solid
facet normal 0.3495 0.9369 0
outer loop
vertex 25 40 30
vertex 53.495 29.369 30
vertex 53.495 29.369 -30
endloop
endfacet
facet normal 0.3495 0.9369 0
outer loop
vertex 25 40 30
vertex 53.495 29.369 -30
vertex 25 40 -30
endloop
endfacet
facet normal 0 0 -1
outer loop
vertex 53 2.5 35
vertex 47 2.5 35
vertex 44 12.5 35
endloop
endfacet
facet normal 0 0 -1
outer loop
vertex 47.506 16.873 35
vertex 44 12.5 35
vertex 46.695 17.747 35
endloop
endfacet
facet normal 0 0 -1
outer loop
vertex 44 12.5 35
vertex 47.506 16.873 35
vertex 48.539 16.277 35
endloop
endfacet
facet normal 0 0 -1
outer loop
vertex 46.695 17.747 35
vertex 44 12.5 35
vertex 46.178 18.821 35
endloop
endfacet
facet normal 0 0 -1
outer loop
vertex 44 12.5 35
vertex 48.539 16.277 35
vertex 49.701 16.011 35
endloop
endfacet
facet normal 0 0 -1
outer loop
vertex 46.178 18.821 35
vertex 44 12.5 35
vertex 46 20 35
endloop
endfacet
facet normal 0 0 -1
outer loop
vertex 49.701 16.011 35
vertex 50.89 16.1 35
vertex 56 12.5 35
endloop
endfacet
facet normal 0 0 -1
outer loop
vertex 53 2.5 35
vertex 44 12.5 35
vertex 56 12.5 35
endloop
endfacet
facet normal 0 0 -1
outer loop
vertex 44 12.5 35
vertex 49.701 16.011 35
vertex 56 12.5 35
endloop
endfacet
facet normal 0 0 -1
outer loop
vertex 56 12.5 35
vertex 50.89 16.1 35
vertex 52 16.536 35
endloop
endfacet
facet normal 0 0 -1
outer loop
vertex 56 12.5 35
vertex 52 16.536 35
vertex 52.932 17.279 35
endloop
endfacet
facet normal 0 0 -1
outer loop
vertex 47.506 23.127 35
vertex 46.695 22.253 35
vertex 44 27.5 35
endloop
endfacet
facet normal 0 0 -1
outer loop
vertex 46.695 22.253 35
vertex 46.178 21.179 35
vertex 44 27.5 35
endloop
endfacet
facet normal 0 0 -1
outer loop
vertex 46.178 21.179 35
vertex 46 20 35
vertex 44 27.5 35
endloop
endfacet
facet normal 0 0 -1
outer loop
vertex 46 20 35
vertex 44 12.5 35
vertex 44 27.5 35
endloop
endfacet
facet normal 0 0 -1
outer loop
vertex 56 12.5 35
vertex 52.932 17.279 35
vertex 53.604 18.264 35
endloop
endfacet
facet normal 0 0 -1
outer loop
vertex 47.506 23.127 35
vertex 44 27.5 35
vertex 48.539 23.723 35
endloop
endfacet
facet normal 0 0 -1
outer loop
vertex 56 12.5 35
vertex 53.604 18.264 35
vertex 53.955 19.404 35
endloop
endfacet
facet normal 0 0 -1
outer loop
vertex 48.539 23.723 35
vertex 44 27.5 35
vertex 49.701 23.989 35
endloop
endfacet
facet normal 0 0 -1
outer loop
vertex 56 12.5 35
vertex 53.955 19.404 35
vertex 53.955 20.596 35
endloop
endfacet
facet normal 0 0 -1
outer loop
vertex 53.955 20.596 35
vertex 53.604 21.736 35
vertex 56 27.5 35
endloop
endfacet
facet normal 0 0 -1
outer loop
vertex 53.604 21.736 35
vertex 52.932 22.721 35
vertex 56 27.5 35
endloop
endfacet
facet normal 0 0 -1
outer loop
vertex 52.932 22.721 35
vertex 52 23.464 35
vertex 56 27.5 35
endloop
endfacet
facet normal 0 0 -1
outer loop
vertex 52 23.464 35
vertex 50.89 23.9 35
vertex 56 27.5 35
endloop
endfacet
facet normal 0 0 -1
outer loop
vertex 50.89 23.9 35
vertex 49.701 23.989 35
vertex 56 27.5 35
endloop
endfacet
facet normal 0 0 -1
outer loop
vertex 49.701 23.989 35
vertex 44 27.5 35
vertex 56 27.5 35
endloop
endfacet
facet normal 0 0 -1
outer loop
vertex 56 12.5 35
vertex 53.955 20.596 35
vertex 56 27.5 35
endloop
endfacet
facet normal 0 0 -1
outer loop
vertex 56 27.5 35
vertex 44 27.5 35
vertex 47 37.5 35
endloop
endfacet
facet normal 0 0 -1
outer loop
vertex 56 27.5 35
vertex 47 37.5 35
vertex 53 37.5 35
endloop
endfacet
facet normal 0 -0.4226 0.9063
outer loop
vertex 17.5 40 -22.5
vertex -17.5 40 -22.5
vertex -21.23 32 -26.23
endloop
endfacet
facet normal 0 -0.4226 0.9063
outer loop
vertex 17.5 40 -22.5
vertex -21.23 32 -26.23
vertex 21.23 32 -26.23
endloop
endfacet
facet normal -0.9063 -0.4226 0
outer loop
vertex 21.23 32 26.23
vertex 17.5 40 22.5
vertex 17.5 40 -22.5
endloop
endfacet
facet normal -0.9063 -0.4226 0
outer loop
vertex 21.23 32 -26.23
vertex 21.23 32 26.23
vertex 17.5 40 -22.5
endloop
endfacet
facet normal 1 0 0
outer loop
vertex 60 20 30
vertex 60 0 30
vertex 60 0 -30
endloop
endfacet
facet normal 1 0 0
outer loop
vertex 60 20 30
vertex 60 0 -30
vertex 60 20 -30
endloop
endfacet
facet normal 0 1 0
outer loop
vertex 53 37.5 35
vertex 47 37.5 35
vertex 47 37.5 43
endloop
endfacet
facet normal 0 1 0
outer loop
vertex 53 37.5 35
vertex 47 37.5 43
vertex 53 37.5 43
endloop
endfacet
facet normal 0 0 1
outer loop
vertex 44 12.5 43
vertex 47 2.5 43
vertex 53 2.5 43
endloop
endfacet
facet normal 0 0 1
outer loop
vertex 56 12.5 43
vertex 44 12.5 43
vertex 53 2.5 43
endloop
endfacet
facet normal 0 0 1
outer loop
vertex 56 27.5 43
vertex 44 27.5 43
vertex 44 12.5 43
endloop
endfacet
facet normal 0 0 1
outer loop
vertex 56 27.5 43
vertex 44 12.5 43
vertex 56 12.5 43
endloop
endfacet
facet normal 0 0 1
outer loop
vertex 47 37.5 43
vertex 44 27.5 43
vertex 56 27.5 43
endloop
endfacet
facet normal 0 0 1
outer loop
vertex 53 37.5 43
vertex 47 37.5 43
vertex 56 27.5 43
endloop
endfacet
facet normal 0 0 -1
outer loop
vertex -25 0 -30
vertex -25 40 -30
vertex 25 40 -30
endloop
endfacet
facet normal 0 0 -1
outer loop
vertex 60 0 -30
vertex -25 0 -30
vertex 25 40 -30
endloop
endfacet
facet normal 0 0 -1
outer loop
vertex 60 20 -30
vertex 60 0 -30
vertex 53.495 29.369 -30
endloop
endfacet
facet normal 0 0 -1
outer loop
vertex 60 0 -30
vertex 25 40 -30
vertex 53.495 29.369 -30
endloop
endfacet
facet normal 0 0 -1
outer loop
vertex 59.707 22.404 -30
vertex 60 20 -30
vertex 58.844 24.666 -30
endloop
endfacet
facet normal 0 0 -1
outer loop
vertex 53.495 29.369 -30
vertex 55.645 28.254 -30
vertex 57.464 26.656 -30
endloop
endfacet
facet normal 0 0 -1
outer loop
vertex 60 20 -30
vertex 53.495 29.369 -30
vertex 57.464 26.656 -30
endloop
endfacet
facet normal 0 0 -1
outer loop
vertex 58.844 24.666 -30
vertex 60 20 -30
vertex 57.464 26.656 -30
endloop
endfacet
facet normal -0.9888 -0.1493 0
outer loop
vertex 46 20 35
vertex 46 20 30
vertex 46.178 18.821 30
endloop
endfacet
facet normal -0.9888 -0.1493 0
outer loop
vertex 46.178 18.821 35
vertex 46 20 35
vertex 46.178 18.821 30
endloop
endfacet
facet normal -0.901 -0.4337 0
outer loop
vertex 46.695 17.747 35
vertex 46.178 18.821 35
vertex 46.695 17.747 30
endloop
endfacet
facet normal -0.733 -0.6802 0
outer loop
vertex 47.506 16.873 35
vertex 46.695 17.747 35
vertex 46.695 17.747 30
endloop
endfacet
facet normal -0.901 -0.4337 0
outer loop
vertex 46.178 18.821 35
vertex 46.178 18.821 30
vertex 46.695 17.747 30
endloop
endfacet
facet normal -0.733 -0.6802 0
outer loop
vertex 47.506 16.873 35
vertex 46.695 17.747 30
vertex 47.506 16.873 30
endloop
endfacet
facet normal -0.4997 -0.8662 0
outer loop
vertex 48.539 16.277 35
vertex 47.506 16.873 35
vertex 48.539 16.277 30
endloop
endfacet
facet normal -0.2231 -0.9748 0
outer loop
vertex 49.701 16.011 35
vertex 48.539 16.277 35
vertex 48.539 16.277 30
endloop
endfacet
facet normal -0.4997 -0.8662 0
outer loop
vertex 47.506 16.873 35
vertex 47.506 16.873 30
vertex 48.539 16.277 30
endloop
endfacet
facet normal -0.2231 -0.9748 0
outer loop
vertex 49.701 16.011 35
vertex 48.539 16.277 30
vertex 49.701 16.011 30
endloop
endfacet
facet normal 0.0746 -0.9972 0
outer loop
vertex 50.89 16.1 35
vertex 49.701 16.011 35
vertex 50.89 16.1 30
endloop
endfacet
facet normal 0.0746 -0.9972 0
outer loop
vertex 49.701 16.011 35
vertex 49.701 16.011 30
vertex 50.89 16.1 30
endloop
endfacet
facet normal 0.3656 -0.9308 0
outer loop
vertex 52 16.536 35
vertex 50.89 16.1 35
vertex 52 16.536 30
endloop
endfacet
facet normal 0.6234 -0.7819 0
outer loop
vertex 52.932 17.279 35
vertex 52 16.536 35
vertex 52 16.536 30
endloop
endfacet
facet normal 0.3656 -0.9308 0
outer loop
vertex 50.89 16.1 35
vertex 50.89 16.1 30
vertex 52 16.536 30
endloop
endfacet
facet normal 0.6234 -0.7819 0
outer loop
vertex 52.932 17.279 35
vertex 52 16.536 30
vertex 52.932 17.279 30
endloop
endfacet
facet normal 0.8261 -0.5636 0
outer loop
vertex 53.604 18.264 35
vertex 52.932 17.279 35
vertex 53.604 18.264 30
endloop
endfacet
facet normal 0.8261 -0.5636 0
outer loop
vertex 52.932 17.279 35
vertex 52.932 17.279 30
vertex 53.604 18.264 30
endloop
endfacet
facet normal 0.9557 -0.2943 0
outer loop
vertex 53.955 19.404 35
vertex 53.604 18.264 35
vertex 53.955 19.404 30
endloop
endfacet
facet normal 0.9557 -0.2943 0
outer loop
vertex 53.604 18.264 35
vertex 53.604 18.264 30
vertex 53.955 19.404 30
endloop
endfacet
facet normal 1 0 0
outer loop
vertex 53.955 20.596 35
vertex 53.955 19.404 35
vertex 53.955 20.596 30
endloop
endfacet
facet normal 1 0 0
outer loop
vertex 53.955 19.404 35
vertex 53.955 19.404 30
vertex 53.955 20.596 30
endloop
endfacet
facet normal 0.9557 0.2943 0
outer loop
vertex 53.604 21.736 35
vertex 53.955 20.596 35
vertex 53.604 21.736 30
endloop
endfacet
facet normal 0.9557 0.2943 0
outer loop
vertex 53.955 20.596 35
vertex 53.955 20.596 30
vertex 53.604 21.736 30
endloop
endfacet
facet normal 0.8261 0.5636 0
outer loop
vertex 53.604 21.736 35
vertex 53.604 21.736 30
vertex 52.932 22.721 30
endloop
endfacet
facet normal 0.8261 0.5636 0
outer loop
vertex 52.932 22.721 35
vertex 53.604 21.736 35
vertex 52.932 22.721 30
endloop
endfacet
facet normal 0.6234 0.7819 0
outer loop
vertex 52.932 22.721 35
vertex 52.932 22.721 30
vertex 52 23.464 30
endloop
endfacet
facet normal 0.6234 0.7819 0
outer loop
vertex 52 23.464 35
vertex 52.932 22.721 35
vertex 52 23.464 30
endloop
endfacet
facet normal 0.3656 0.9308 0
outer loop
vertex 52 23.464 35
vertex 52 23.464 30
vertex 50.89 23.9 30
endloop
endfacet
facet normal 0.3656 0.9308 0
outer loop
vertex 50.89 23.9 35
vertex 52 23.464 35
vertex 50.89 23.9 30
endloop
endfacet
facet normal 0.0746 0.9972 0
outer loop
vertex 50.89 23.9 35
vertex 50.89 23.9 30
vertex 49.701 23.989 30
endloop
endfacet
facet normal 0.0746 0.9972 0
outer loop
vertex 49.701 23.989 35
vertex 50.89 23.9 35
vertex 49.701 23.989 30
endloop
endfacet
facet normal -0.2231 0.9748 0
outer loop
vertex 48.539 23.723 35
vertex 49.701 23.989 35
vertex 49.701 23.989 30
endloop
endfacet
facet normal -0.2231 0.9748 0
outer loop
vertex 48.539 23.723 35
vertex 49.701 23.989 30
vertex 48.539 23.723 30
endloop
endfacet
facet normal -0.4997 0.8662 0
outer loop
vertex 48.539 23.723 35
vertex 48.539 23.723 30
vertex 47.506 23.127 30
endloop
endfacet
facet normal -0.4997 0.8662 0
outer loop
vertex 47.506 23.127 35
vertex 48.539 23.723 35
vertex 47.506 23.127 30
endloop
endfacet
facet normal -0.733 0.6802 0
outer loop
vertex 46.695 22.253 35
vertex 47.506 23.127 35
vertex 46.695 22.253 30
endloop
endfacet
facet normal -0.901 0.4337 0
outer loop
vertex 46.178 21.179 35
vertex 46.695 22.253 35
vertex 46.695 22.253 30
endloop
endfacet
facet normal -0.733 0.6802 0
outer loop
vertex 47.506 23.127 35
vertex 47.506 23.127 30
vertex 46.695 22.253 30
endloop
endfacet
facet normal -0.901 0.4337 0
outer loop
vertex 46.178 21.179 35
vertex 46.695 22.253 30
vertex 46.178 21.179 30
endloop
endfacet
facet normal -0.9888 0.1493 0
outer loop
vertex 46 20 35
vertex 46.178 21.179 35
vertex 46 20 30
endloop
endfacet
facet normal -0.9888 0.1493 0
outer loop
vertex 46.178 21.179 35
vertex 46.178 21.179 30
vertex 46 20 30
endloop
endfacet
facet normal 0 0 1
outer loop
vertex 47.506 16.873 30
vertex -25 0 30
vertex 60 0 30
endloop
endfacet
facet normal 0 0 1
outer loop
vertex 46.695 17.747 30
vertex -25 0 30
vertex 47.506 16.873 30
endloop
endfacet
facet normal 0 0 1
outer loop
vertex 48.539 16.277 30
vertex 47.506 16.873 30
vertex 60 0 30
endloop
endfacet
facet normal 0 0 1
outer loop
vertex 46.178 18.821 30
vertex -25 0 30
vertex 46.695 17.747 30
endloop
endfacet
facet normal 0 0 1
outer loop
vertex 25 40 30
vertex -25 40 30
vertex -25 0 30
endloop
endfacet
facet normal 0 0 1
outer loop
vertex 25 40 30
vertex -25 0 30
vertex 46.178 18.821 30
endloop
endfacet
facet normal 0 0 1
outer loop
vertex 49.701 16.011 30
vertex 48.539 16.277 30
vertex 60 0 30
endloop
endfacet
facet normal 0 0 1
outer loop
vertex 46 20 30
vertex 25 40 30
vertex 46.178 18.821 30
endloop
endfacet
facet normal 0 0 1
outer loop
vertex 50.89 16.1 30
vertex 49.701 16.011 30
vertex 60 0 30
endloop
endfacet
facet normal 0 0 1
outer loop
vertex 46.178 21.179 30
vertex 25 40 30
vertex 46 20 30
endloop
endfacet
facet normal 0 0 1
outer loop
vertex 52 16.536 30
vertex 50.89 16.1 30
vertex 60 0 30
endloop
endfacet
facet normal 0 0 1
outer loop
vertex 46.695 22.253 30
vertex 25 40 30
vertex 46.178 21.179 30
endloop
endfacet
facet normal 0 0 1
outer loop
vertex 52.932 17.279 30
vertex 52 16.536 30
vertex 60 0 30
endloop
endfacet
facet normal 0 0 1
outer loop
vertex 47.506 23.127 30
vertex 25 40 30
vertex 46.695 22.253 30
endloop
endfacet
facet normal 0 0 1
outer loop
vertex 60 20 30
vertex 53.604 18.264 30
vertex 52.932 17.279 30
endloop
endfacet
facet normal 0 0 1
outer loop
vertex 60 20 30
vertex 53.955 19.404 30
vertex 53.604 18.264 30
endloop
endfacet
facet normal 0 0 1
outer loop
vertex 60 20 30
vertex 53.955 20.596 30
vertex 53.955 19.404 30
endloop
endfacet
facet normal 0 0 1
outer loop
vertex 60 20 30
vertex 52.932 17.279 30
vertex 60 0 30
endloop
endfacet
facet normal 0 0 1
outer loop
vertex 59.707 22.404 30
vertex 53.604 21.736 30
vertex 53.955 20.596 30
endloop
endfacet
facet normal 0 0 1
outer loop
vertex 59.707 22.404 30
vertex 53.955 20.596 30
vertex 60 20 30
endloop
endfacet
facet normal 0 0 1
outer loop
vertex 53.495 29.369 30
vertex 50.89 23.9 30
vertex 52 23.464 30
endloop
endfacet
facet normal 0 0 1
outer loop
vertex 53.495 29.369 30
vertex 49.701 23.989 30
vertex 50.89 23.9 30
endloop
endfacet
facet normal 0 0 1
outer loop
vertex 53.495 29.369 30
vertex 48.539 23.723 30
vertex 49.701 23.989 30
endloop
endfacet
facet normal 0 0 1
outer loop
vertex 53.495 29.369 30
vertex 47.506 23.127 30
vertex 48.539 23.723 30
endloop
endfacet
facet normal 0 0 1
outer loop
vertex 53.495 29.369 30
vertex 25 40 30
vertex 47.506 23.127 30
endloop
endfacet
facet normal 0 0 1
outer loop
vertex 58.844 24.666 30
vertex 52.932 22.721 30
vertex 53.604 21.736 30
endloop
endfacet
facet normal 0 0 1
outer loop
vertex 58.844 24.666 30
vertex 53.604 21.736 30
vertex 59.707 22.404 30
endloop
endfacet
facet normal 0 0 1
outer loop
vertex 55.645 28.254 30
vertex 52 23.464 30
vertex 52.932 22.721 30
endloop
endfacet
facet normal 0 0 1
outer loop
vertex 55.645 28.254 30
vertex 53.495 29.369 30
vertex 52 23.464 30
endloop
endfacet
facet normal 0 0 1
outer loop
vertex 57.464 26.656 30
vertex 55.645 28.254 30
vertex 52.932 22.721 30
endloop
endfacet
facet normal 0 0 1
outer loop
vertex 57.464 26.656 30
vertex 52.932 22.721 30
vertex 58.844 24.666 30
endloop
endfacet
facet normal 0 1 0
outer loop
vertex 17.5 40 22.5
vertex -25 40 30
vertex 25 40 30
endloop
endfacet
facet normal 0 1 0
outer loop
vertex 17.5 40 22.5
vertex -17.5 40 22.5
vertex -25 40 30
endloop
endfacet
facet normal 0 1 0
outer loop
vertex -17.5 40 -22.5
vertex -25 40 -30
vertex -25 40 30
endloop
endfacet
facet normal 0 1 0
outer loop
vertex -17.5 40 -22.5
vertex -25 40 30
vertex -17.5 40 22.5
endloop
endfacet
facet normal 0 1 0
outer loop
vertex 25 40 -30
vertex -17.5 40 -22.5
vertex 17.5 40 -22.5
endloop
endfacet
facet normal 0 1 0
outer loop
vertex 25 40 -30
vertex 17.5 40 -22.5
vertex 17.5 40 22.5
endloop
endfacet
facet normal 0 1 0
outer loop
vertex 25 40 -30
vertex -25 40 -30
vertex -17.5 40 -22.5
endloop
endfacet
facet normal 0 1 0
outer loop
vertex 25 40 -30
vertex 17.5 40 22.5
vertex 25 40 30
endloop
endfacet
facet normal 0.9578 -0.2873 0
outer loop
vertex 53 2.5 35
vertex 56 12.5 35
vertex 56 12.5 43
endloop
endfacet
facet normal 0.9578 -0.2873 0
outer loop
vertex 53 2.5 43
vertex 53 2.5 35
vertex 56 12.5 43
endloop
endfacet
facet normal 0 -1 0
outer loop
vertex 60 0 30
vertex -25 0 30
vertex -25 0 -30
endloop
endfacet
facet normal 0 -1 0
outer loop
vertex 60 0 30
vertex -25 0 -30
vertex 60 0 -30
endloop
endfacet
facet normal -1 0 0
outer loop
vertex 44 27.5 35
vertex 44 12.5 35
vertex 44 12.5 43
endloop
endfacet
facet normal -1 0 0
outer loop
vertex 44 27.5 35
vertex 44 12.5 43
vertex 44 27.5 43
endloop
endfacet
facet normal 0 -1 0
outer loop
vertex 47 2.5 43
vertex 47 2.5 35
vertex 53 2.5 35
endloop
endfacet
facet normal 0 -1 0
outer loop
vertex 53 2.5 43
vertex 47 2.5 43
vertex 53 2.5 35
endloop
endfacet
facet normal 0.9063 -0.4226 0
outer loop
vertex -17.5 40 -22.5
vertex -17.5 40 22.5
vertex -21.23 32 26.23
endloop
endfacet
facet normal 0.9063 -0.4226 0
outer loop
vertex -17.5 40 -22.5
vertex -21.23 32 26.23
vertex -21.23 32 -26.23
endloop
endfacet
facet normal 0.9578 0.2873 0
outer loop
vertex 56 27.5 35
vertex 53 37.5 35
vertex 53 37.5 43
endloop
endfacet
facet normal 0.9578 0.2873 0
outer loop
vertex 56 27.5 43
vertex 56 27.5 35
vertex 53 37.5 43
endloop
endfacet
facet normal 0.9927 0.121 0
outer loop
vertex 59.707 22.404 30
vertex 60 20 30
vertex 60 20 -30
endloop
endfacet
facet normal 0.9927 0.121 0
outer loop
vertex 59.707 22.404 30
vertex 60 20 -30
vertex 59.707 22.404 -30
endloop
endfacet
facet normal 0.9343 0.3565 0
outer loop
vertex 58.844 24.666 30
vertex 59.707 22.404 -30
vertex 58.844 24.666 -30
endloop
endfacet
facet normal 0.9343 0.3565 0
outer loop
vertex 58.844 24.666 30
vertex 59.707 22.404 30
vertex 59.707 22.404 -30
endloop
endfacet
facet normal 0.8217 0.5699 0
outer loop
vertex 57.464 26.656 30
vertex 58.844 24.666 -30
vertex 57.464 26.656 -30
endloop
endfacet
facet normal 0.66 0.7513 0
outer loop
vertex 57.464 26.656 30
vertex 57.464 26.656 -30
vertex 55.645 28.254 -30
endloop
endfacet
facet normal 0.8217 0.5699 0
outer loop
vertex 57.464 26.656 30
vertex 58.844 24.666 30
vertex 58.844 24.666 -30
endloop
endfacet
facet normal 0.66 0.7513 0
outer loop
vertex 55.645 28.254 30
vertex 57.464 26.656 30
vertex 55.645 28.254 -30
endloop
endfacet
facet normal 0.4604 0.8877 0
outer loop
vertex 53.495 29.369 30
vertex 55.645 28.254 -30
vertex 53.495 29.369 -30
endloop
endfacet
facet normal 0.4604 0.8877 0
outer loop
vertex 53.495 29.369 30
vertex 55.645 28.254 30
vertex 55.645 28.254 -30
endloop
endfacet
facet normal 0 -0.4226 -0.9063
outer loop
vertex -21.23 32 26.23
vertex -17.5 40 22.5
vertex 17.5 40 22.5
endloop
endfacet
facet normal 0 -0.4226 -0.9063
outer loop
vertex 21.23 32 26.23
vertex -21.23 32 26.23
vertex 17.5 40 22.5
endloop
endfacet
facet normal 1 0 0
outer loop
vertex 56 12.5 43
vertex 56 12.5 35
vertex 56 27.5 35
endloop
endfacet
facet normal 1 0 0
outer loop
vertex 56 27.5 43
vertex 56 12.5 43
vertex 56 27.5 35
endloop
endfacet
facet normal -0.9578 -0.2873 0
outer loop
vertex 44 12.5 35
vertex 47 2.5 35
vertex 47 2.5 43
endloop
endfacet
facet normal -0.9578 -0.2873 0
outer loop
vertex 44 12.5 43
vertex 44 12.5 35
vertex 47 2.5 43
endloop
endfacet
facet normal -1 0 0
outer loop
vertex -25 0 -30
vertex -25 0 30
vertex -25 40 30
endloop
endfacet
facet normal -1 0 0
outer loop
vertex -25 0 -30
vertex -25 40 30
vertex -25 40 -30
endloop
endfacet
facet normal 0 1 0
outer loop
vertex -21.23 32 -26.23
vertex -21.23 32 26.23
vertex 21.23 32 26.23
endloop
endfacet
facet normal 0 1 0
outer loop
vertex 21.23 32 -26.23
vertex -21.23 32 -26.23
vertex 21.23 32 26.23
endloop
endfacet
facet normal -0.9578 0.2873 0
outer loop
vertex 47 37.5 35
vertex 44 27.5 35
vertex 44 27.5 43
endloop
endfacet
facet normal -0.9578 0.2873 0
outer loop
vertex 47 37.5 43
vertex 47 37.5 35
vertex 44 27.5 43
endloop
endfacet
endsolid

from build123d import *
from OCP.BRepFilletAPI import BRepFilletAPI_MakeChamfer

# Parameters (mm, degrees)
SKETCH1_W           = 50
SKETCH1_H           = 60
BOSS_EXTRUDE1_DEPTH = 40
BOSS_EXTRUDE2_DEPTH = 60
SKETCH3_W           = 35
SKETCH3_H           = 45
CUT_EXTRUDE1_DEPTH  = 8
CUT_EXTRUDE1_DRAFT  = 25
SKETCH4_R           = 4
BOSS_EXTRUDE3_DEPTH = 5
SKETCH5_W           = 12
SKETCH5_H           = 35
BOSS_EXTRUDE4_DEPTH = 8
CHAMFER1_SIZE       = 3
CHAMFER1_SIZE2      = 10
CHAMFER2_SIZE       = 10
CHAMFER2_SIZE2      = 3


with BuildPart() as part:
    # Sketch1 → Boss-Extrude1 (new body)
    with BuildSketch(Plane(origin=(0, 0, 0), x_dir=(1, 0, 0), z_dir=(0, 1, 0))):
        Rectangle(SKETCH1_W, SKETCH1_H)
    extrude(amount=BOSS_EXTRUDE1_DEPTH)

    # Sketch2 → Boss-Extrude2 (add)
    with BuildSketch(Plane.XY.offset(30)):
        with BuildLine():
            Line((53.495378078, 29.369222598), (25, 40))
            Line((25, 40), (25, 0))
            Line((25, 0), (60, 0))
            Line((60, 0), (60, 20))
            ThreePointArc((60, 20), (58.214431836, 25.702903612), (53.495378078, 29.369222598))
        make_face()
    extrude(amount=-BOSS_EXTRUDE2_DEPTH)


with BuildPart() as cut_extrude1_tool:
    # Sketch3 → Cut-Extrude1 (with draft: the straight prism first)
    with BuildSketch(Plane(origin=(0, 40, 0), x_dir=(1, 0, 0), z_dir=(0, 1, 0))):
        Rectangle(SKETCH3_W, SKETCH3_H)
    extrude(amount=-CUT_EXTRUDE1_DEPTH)
    # Cut-Extrude1: the draft: its side faces are tilted about the plane it starts from
    cut_extrude1_sides = [cut_extrude1_tool.faces().sort_by_distance(p)[0] for p in [
        (0, 36, 22.5),
        (17.5, 36, 0),
        (0, 36, -22.5),
        (-17.5, 36, 0),
    ]]
    draft(cut_extrude1_sides, Plane(origin=(0, 40, 0), x_dir=(1, 0, 0), z_dir=(0, 1, 0)), CUT_EXTRUDE1_DRAFT)


with BuildPart() as part_1:
    add(part.part)

    # Cut-Extrude1: cut by cut_extrude1_tool
    add(cut_extrude1_tool.part, mode=Mode.SUBTRACT)

    # Sketch4 → Boss-Extrude3 (add)
    with BuildSketch(Plane.XY.offset(30)):
        with Locations(Location((50, 20, 0), (0, 0, 180))):
            Circle(SKETCH4_R)
    extrude(amount=BOSS_EXTRUDE3_DEPTH)

    # Sketch5 → Boss-Extrude4 (add)
    with BuildSketch(Plane.XY.offset(35)):
        with Locations((50, 20)):
            Rectangle(SKETCH5_W, SKETCH5_H)
    extrude(amount=BOSS_EXTRUDE4_DEPTH)

    # Chamfer1: one chamfer whose edges measure the first distance from different faces: ONE call of the kernel's chamfer builder (chamfer() names one face for all edges)
    chamfer1_edges_1 = [part_1.edges().sort_by_distance(p)[0] for p in [
        (56, 2.5, 39),
    ]]
    chamfer1_side_1 = [part_1.faces().sort_by_distance(p)[0] for p in [
        (50, 2.5, 39),
    ]]
    chamfer1_edges_2 = [part_1.edges().sort_by_distance(p)[0] for p in [
        (44, 37.5, 39),
    ]]
    chamfer1_side_2 = [part_1.faces().sort_by_distance(p)[0] for p in [
        (50, 37.5, 39),
    ]]
    chamfer1 = BRepFilletAPI_MakeChamfer(part_1.part.solid().wrapped)
    for e in chamfer1_edges_1:
        chamfer1.Add(CHAMFER1_SIZE, CHAMFER1_SIZE2, e.wrapped, chamfer1_side_1[0].wrapped)  # the first distance lies on this face
    for e in chamfer1_edges_2:
        chamfer1.Add(CHAMFER1_SIZE, CHAMFER1_SIZE2, e.wrapped, chamfer1_side_2[0].wrapped)  # the first distance lies on this face
    add(Compound.cast(chamfer1.Shape()), mode=Mode.REPLACE)

    # Chamfer2: one chamfer whose edges measure the first distance from different faces: ONE call of the kernel's chamfer builder (chamfer() names one face for all edges)
    chamfer2_edges_1 = [part_1.edges().sort_by_distance(p)[0] for p in [
        (56, 37.5, 39),
    ]]
    chamfer2_side_1 = [part_1.faces().sort_by_distance(p)[0] for p in [
        (56, 25, 39),
    ]]
    chamfer2_edges_2 = [part_1.edges().sort_by_distance(p)[0] for p in [
        (44, 2.5, 39),
    ]]
    chamfer2_side_2 = [part_1.faces().sort_by_distance(p)[0] for p in [
        (44, 15, 39),
    ]]
    chamfer2 = BRepFilletAPI_MakeChamfer(part_1.part.solid().wrapped)
    for e in chamfer2_edges_1:
        chamfer2.Add(CHAMFER2_SIZE, CHAMFER2_SIZE2, e.wrapped, chamfer2_side_1[0].wrapped)  # the first distance lies on this face
    for e in chamfer2_edges_2:
        chamfer2.Add(CHAMFER2_SIZE, CHAMFER2_SIZE2, e.wrapped, chamfer2_side_2[0].wrapped)  # the first distance lies on this face
    add(Compound.cast(chamfer2.Shape()), mode=Mode.REPLACE)


solid = part_1.part
